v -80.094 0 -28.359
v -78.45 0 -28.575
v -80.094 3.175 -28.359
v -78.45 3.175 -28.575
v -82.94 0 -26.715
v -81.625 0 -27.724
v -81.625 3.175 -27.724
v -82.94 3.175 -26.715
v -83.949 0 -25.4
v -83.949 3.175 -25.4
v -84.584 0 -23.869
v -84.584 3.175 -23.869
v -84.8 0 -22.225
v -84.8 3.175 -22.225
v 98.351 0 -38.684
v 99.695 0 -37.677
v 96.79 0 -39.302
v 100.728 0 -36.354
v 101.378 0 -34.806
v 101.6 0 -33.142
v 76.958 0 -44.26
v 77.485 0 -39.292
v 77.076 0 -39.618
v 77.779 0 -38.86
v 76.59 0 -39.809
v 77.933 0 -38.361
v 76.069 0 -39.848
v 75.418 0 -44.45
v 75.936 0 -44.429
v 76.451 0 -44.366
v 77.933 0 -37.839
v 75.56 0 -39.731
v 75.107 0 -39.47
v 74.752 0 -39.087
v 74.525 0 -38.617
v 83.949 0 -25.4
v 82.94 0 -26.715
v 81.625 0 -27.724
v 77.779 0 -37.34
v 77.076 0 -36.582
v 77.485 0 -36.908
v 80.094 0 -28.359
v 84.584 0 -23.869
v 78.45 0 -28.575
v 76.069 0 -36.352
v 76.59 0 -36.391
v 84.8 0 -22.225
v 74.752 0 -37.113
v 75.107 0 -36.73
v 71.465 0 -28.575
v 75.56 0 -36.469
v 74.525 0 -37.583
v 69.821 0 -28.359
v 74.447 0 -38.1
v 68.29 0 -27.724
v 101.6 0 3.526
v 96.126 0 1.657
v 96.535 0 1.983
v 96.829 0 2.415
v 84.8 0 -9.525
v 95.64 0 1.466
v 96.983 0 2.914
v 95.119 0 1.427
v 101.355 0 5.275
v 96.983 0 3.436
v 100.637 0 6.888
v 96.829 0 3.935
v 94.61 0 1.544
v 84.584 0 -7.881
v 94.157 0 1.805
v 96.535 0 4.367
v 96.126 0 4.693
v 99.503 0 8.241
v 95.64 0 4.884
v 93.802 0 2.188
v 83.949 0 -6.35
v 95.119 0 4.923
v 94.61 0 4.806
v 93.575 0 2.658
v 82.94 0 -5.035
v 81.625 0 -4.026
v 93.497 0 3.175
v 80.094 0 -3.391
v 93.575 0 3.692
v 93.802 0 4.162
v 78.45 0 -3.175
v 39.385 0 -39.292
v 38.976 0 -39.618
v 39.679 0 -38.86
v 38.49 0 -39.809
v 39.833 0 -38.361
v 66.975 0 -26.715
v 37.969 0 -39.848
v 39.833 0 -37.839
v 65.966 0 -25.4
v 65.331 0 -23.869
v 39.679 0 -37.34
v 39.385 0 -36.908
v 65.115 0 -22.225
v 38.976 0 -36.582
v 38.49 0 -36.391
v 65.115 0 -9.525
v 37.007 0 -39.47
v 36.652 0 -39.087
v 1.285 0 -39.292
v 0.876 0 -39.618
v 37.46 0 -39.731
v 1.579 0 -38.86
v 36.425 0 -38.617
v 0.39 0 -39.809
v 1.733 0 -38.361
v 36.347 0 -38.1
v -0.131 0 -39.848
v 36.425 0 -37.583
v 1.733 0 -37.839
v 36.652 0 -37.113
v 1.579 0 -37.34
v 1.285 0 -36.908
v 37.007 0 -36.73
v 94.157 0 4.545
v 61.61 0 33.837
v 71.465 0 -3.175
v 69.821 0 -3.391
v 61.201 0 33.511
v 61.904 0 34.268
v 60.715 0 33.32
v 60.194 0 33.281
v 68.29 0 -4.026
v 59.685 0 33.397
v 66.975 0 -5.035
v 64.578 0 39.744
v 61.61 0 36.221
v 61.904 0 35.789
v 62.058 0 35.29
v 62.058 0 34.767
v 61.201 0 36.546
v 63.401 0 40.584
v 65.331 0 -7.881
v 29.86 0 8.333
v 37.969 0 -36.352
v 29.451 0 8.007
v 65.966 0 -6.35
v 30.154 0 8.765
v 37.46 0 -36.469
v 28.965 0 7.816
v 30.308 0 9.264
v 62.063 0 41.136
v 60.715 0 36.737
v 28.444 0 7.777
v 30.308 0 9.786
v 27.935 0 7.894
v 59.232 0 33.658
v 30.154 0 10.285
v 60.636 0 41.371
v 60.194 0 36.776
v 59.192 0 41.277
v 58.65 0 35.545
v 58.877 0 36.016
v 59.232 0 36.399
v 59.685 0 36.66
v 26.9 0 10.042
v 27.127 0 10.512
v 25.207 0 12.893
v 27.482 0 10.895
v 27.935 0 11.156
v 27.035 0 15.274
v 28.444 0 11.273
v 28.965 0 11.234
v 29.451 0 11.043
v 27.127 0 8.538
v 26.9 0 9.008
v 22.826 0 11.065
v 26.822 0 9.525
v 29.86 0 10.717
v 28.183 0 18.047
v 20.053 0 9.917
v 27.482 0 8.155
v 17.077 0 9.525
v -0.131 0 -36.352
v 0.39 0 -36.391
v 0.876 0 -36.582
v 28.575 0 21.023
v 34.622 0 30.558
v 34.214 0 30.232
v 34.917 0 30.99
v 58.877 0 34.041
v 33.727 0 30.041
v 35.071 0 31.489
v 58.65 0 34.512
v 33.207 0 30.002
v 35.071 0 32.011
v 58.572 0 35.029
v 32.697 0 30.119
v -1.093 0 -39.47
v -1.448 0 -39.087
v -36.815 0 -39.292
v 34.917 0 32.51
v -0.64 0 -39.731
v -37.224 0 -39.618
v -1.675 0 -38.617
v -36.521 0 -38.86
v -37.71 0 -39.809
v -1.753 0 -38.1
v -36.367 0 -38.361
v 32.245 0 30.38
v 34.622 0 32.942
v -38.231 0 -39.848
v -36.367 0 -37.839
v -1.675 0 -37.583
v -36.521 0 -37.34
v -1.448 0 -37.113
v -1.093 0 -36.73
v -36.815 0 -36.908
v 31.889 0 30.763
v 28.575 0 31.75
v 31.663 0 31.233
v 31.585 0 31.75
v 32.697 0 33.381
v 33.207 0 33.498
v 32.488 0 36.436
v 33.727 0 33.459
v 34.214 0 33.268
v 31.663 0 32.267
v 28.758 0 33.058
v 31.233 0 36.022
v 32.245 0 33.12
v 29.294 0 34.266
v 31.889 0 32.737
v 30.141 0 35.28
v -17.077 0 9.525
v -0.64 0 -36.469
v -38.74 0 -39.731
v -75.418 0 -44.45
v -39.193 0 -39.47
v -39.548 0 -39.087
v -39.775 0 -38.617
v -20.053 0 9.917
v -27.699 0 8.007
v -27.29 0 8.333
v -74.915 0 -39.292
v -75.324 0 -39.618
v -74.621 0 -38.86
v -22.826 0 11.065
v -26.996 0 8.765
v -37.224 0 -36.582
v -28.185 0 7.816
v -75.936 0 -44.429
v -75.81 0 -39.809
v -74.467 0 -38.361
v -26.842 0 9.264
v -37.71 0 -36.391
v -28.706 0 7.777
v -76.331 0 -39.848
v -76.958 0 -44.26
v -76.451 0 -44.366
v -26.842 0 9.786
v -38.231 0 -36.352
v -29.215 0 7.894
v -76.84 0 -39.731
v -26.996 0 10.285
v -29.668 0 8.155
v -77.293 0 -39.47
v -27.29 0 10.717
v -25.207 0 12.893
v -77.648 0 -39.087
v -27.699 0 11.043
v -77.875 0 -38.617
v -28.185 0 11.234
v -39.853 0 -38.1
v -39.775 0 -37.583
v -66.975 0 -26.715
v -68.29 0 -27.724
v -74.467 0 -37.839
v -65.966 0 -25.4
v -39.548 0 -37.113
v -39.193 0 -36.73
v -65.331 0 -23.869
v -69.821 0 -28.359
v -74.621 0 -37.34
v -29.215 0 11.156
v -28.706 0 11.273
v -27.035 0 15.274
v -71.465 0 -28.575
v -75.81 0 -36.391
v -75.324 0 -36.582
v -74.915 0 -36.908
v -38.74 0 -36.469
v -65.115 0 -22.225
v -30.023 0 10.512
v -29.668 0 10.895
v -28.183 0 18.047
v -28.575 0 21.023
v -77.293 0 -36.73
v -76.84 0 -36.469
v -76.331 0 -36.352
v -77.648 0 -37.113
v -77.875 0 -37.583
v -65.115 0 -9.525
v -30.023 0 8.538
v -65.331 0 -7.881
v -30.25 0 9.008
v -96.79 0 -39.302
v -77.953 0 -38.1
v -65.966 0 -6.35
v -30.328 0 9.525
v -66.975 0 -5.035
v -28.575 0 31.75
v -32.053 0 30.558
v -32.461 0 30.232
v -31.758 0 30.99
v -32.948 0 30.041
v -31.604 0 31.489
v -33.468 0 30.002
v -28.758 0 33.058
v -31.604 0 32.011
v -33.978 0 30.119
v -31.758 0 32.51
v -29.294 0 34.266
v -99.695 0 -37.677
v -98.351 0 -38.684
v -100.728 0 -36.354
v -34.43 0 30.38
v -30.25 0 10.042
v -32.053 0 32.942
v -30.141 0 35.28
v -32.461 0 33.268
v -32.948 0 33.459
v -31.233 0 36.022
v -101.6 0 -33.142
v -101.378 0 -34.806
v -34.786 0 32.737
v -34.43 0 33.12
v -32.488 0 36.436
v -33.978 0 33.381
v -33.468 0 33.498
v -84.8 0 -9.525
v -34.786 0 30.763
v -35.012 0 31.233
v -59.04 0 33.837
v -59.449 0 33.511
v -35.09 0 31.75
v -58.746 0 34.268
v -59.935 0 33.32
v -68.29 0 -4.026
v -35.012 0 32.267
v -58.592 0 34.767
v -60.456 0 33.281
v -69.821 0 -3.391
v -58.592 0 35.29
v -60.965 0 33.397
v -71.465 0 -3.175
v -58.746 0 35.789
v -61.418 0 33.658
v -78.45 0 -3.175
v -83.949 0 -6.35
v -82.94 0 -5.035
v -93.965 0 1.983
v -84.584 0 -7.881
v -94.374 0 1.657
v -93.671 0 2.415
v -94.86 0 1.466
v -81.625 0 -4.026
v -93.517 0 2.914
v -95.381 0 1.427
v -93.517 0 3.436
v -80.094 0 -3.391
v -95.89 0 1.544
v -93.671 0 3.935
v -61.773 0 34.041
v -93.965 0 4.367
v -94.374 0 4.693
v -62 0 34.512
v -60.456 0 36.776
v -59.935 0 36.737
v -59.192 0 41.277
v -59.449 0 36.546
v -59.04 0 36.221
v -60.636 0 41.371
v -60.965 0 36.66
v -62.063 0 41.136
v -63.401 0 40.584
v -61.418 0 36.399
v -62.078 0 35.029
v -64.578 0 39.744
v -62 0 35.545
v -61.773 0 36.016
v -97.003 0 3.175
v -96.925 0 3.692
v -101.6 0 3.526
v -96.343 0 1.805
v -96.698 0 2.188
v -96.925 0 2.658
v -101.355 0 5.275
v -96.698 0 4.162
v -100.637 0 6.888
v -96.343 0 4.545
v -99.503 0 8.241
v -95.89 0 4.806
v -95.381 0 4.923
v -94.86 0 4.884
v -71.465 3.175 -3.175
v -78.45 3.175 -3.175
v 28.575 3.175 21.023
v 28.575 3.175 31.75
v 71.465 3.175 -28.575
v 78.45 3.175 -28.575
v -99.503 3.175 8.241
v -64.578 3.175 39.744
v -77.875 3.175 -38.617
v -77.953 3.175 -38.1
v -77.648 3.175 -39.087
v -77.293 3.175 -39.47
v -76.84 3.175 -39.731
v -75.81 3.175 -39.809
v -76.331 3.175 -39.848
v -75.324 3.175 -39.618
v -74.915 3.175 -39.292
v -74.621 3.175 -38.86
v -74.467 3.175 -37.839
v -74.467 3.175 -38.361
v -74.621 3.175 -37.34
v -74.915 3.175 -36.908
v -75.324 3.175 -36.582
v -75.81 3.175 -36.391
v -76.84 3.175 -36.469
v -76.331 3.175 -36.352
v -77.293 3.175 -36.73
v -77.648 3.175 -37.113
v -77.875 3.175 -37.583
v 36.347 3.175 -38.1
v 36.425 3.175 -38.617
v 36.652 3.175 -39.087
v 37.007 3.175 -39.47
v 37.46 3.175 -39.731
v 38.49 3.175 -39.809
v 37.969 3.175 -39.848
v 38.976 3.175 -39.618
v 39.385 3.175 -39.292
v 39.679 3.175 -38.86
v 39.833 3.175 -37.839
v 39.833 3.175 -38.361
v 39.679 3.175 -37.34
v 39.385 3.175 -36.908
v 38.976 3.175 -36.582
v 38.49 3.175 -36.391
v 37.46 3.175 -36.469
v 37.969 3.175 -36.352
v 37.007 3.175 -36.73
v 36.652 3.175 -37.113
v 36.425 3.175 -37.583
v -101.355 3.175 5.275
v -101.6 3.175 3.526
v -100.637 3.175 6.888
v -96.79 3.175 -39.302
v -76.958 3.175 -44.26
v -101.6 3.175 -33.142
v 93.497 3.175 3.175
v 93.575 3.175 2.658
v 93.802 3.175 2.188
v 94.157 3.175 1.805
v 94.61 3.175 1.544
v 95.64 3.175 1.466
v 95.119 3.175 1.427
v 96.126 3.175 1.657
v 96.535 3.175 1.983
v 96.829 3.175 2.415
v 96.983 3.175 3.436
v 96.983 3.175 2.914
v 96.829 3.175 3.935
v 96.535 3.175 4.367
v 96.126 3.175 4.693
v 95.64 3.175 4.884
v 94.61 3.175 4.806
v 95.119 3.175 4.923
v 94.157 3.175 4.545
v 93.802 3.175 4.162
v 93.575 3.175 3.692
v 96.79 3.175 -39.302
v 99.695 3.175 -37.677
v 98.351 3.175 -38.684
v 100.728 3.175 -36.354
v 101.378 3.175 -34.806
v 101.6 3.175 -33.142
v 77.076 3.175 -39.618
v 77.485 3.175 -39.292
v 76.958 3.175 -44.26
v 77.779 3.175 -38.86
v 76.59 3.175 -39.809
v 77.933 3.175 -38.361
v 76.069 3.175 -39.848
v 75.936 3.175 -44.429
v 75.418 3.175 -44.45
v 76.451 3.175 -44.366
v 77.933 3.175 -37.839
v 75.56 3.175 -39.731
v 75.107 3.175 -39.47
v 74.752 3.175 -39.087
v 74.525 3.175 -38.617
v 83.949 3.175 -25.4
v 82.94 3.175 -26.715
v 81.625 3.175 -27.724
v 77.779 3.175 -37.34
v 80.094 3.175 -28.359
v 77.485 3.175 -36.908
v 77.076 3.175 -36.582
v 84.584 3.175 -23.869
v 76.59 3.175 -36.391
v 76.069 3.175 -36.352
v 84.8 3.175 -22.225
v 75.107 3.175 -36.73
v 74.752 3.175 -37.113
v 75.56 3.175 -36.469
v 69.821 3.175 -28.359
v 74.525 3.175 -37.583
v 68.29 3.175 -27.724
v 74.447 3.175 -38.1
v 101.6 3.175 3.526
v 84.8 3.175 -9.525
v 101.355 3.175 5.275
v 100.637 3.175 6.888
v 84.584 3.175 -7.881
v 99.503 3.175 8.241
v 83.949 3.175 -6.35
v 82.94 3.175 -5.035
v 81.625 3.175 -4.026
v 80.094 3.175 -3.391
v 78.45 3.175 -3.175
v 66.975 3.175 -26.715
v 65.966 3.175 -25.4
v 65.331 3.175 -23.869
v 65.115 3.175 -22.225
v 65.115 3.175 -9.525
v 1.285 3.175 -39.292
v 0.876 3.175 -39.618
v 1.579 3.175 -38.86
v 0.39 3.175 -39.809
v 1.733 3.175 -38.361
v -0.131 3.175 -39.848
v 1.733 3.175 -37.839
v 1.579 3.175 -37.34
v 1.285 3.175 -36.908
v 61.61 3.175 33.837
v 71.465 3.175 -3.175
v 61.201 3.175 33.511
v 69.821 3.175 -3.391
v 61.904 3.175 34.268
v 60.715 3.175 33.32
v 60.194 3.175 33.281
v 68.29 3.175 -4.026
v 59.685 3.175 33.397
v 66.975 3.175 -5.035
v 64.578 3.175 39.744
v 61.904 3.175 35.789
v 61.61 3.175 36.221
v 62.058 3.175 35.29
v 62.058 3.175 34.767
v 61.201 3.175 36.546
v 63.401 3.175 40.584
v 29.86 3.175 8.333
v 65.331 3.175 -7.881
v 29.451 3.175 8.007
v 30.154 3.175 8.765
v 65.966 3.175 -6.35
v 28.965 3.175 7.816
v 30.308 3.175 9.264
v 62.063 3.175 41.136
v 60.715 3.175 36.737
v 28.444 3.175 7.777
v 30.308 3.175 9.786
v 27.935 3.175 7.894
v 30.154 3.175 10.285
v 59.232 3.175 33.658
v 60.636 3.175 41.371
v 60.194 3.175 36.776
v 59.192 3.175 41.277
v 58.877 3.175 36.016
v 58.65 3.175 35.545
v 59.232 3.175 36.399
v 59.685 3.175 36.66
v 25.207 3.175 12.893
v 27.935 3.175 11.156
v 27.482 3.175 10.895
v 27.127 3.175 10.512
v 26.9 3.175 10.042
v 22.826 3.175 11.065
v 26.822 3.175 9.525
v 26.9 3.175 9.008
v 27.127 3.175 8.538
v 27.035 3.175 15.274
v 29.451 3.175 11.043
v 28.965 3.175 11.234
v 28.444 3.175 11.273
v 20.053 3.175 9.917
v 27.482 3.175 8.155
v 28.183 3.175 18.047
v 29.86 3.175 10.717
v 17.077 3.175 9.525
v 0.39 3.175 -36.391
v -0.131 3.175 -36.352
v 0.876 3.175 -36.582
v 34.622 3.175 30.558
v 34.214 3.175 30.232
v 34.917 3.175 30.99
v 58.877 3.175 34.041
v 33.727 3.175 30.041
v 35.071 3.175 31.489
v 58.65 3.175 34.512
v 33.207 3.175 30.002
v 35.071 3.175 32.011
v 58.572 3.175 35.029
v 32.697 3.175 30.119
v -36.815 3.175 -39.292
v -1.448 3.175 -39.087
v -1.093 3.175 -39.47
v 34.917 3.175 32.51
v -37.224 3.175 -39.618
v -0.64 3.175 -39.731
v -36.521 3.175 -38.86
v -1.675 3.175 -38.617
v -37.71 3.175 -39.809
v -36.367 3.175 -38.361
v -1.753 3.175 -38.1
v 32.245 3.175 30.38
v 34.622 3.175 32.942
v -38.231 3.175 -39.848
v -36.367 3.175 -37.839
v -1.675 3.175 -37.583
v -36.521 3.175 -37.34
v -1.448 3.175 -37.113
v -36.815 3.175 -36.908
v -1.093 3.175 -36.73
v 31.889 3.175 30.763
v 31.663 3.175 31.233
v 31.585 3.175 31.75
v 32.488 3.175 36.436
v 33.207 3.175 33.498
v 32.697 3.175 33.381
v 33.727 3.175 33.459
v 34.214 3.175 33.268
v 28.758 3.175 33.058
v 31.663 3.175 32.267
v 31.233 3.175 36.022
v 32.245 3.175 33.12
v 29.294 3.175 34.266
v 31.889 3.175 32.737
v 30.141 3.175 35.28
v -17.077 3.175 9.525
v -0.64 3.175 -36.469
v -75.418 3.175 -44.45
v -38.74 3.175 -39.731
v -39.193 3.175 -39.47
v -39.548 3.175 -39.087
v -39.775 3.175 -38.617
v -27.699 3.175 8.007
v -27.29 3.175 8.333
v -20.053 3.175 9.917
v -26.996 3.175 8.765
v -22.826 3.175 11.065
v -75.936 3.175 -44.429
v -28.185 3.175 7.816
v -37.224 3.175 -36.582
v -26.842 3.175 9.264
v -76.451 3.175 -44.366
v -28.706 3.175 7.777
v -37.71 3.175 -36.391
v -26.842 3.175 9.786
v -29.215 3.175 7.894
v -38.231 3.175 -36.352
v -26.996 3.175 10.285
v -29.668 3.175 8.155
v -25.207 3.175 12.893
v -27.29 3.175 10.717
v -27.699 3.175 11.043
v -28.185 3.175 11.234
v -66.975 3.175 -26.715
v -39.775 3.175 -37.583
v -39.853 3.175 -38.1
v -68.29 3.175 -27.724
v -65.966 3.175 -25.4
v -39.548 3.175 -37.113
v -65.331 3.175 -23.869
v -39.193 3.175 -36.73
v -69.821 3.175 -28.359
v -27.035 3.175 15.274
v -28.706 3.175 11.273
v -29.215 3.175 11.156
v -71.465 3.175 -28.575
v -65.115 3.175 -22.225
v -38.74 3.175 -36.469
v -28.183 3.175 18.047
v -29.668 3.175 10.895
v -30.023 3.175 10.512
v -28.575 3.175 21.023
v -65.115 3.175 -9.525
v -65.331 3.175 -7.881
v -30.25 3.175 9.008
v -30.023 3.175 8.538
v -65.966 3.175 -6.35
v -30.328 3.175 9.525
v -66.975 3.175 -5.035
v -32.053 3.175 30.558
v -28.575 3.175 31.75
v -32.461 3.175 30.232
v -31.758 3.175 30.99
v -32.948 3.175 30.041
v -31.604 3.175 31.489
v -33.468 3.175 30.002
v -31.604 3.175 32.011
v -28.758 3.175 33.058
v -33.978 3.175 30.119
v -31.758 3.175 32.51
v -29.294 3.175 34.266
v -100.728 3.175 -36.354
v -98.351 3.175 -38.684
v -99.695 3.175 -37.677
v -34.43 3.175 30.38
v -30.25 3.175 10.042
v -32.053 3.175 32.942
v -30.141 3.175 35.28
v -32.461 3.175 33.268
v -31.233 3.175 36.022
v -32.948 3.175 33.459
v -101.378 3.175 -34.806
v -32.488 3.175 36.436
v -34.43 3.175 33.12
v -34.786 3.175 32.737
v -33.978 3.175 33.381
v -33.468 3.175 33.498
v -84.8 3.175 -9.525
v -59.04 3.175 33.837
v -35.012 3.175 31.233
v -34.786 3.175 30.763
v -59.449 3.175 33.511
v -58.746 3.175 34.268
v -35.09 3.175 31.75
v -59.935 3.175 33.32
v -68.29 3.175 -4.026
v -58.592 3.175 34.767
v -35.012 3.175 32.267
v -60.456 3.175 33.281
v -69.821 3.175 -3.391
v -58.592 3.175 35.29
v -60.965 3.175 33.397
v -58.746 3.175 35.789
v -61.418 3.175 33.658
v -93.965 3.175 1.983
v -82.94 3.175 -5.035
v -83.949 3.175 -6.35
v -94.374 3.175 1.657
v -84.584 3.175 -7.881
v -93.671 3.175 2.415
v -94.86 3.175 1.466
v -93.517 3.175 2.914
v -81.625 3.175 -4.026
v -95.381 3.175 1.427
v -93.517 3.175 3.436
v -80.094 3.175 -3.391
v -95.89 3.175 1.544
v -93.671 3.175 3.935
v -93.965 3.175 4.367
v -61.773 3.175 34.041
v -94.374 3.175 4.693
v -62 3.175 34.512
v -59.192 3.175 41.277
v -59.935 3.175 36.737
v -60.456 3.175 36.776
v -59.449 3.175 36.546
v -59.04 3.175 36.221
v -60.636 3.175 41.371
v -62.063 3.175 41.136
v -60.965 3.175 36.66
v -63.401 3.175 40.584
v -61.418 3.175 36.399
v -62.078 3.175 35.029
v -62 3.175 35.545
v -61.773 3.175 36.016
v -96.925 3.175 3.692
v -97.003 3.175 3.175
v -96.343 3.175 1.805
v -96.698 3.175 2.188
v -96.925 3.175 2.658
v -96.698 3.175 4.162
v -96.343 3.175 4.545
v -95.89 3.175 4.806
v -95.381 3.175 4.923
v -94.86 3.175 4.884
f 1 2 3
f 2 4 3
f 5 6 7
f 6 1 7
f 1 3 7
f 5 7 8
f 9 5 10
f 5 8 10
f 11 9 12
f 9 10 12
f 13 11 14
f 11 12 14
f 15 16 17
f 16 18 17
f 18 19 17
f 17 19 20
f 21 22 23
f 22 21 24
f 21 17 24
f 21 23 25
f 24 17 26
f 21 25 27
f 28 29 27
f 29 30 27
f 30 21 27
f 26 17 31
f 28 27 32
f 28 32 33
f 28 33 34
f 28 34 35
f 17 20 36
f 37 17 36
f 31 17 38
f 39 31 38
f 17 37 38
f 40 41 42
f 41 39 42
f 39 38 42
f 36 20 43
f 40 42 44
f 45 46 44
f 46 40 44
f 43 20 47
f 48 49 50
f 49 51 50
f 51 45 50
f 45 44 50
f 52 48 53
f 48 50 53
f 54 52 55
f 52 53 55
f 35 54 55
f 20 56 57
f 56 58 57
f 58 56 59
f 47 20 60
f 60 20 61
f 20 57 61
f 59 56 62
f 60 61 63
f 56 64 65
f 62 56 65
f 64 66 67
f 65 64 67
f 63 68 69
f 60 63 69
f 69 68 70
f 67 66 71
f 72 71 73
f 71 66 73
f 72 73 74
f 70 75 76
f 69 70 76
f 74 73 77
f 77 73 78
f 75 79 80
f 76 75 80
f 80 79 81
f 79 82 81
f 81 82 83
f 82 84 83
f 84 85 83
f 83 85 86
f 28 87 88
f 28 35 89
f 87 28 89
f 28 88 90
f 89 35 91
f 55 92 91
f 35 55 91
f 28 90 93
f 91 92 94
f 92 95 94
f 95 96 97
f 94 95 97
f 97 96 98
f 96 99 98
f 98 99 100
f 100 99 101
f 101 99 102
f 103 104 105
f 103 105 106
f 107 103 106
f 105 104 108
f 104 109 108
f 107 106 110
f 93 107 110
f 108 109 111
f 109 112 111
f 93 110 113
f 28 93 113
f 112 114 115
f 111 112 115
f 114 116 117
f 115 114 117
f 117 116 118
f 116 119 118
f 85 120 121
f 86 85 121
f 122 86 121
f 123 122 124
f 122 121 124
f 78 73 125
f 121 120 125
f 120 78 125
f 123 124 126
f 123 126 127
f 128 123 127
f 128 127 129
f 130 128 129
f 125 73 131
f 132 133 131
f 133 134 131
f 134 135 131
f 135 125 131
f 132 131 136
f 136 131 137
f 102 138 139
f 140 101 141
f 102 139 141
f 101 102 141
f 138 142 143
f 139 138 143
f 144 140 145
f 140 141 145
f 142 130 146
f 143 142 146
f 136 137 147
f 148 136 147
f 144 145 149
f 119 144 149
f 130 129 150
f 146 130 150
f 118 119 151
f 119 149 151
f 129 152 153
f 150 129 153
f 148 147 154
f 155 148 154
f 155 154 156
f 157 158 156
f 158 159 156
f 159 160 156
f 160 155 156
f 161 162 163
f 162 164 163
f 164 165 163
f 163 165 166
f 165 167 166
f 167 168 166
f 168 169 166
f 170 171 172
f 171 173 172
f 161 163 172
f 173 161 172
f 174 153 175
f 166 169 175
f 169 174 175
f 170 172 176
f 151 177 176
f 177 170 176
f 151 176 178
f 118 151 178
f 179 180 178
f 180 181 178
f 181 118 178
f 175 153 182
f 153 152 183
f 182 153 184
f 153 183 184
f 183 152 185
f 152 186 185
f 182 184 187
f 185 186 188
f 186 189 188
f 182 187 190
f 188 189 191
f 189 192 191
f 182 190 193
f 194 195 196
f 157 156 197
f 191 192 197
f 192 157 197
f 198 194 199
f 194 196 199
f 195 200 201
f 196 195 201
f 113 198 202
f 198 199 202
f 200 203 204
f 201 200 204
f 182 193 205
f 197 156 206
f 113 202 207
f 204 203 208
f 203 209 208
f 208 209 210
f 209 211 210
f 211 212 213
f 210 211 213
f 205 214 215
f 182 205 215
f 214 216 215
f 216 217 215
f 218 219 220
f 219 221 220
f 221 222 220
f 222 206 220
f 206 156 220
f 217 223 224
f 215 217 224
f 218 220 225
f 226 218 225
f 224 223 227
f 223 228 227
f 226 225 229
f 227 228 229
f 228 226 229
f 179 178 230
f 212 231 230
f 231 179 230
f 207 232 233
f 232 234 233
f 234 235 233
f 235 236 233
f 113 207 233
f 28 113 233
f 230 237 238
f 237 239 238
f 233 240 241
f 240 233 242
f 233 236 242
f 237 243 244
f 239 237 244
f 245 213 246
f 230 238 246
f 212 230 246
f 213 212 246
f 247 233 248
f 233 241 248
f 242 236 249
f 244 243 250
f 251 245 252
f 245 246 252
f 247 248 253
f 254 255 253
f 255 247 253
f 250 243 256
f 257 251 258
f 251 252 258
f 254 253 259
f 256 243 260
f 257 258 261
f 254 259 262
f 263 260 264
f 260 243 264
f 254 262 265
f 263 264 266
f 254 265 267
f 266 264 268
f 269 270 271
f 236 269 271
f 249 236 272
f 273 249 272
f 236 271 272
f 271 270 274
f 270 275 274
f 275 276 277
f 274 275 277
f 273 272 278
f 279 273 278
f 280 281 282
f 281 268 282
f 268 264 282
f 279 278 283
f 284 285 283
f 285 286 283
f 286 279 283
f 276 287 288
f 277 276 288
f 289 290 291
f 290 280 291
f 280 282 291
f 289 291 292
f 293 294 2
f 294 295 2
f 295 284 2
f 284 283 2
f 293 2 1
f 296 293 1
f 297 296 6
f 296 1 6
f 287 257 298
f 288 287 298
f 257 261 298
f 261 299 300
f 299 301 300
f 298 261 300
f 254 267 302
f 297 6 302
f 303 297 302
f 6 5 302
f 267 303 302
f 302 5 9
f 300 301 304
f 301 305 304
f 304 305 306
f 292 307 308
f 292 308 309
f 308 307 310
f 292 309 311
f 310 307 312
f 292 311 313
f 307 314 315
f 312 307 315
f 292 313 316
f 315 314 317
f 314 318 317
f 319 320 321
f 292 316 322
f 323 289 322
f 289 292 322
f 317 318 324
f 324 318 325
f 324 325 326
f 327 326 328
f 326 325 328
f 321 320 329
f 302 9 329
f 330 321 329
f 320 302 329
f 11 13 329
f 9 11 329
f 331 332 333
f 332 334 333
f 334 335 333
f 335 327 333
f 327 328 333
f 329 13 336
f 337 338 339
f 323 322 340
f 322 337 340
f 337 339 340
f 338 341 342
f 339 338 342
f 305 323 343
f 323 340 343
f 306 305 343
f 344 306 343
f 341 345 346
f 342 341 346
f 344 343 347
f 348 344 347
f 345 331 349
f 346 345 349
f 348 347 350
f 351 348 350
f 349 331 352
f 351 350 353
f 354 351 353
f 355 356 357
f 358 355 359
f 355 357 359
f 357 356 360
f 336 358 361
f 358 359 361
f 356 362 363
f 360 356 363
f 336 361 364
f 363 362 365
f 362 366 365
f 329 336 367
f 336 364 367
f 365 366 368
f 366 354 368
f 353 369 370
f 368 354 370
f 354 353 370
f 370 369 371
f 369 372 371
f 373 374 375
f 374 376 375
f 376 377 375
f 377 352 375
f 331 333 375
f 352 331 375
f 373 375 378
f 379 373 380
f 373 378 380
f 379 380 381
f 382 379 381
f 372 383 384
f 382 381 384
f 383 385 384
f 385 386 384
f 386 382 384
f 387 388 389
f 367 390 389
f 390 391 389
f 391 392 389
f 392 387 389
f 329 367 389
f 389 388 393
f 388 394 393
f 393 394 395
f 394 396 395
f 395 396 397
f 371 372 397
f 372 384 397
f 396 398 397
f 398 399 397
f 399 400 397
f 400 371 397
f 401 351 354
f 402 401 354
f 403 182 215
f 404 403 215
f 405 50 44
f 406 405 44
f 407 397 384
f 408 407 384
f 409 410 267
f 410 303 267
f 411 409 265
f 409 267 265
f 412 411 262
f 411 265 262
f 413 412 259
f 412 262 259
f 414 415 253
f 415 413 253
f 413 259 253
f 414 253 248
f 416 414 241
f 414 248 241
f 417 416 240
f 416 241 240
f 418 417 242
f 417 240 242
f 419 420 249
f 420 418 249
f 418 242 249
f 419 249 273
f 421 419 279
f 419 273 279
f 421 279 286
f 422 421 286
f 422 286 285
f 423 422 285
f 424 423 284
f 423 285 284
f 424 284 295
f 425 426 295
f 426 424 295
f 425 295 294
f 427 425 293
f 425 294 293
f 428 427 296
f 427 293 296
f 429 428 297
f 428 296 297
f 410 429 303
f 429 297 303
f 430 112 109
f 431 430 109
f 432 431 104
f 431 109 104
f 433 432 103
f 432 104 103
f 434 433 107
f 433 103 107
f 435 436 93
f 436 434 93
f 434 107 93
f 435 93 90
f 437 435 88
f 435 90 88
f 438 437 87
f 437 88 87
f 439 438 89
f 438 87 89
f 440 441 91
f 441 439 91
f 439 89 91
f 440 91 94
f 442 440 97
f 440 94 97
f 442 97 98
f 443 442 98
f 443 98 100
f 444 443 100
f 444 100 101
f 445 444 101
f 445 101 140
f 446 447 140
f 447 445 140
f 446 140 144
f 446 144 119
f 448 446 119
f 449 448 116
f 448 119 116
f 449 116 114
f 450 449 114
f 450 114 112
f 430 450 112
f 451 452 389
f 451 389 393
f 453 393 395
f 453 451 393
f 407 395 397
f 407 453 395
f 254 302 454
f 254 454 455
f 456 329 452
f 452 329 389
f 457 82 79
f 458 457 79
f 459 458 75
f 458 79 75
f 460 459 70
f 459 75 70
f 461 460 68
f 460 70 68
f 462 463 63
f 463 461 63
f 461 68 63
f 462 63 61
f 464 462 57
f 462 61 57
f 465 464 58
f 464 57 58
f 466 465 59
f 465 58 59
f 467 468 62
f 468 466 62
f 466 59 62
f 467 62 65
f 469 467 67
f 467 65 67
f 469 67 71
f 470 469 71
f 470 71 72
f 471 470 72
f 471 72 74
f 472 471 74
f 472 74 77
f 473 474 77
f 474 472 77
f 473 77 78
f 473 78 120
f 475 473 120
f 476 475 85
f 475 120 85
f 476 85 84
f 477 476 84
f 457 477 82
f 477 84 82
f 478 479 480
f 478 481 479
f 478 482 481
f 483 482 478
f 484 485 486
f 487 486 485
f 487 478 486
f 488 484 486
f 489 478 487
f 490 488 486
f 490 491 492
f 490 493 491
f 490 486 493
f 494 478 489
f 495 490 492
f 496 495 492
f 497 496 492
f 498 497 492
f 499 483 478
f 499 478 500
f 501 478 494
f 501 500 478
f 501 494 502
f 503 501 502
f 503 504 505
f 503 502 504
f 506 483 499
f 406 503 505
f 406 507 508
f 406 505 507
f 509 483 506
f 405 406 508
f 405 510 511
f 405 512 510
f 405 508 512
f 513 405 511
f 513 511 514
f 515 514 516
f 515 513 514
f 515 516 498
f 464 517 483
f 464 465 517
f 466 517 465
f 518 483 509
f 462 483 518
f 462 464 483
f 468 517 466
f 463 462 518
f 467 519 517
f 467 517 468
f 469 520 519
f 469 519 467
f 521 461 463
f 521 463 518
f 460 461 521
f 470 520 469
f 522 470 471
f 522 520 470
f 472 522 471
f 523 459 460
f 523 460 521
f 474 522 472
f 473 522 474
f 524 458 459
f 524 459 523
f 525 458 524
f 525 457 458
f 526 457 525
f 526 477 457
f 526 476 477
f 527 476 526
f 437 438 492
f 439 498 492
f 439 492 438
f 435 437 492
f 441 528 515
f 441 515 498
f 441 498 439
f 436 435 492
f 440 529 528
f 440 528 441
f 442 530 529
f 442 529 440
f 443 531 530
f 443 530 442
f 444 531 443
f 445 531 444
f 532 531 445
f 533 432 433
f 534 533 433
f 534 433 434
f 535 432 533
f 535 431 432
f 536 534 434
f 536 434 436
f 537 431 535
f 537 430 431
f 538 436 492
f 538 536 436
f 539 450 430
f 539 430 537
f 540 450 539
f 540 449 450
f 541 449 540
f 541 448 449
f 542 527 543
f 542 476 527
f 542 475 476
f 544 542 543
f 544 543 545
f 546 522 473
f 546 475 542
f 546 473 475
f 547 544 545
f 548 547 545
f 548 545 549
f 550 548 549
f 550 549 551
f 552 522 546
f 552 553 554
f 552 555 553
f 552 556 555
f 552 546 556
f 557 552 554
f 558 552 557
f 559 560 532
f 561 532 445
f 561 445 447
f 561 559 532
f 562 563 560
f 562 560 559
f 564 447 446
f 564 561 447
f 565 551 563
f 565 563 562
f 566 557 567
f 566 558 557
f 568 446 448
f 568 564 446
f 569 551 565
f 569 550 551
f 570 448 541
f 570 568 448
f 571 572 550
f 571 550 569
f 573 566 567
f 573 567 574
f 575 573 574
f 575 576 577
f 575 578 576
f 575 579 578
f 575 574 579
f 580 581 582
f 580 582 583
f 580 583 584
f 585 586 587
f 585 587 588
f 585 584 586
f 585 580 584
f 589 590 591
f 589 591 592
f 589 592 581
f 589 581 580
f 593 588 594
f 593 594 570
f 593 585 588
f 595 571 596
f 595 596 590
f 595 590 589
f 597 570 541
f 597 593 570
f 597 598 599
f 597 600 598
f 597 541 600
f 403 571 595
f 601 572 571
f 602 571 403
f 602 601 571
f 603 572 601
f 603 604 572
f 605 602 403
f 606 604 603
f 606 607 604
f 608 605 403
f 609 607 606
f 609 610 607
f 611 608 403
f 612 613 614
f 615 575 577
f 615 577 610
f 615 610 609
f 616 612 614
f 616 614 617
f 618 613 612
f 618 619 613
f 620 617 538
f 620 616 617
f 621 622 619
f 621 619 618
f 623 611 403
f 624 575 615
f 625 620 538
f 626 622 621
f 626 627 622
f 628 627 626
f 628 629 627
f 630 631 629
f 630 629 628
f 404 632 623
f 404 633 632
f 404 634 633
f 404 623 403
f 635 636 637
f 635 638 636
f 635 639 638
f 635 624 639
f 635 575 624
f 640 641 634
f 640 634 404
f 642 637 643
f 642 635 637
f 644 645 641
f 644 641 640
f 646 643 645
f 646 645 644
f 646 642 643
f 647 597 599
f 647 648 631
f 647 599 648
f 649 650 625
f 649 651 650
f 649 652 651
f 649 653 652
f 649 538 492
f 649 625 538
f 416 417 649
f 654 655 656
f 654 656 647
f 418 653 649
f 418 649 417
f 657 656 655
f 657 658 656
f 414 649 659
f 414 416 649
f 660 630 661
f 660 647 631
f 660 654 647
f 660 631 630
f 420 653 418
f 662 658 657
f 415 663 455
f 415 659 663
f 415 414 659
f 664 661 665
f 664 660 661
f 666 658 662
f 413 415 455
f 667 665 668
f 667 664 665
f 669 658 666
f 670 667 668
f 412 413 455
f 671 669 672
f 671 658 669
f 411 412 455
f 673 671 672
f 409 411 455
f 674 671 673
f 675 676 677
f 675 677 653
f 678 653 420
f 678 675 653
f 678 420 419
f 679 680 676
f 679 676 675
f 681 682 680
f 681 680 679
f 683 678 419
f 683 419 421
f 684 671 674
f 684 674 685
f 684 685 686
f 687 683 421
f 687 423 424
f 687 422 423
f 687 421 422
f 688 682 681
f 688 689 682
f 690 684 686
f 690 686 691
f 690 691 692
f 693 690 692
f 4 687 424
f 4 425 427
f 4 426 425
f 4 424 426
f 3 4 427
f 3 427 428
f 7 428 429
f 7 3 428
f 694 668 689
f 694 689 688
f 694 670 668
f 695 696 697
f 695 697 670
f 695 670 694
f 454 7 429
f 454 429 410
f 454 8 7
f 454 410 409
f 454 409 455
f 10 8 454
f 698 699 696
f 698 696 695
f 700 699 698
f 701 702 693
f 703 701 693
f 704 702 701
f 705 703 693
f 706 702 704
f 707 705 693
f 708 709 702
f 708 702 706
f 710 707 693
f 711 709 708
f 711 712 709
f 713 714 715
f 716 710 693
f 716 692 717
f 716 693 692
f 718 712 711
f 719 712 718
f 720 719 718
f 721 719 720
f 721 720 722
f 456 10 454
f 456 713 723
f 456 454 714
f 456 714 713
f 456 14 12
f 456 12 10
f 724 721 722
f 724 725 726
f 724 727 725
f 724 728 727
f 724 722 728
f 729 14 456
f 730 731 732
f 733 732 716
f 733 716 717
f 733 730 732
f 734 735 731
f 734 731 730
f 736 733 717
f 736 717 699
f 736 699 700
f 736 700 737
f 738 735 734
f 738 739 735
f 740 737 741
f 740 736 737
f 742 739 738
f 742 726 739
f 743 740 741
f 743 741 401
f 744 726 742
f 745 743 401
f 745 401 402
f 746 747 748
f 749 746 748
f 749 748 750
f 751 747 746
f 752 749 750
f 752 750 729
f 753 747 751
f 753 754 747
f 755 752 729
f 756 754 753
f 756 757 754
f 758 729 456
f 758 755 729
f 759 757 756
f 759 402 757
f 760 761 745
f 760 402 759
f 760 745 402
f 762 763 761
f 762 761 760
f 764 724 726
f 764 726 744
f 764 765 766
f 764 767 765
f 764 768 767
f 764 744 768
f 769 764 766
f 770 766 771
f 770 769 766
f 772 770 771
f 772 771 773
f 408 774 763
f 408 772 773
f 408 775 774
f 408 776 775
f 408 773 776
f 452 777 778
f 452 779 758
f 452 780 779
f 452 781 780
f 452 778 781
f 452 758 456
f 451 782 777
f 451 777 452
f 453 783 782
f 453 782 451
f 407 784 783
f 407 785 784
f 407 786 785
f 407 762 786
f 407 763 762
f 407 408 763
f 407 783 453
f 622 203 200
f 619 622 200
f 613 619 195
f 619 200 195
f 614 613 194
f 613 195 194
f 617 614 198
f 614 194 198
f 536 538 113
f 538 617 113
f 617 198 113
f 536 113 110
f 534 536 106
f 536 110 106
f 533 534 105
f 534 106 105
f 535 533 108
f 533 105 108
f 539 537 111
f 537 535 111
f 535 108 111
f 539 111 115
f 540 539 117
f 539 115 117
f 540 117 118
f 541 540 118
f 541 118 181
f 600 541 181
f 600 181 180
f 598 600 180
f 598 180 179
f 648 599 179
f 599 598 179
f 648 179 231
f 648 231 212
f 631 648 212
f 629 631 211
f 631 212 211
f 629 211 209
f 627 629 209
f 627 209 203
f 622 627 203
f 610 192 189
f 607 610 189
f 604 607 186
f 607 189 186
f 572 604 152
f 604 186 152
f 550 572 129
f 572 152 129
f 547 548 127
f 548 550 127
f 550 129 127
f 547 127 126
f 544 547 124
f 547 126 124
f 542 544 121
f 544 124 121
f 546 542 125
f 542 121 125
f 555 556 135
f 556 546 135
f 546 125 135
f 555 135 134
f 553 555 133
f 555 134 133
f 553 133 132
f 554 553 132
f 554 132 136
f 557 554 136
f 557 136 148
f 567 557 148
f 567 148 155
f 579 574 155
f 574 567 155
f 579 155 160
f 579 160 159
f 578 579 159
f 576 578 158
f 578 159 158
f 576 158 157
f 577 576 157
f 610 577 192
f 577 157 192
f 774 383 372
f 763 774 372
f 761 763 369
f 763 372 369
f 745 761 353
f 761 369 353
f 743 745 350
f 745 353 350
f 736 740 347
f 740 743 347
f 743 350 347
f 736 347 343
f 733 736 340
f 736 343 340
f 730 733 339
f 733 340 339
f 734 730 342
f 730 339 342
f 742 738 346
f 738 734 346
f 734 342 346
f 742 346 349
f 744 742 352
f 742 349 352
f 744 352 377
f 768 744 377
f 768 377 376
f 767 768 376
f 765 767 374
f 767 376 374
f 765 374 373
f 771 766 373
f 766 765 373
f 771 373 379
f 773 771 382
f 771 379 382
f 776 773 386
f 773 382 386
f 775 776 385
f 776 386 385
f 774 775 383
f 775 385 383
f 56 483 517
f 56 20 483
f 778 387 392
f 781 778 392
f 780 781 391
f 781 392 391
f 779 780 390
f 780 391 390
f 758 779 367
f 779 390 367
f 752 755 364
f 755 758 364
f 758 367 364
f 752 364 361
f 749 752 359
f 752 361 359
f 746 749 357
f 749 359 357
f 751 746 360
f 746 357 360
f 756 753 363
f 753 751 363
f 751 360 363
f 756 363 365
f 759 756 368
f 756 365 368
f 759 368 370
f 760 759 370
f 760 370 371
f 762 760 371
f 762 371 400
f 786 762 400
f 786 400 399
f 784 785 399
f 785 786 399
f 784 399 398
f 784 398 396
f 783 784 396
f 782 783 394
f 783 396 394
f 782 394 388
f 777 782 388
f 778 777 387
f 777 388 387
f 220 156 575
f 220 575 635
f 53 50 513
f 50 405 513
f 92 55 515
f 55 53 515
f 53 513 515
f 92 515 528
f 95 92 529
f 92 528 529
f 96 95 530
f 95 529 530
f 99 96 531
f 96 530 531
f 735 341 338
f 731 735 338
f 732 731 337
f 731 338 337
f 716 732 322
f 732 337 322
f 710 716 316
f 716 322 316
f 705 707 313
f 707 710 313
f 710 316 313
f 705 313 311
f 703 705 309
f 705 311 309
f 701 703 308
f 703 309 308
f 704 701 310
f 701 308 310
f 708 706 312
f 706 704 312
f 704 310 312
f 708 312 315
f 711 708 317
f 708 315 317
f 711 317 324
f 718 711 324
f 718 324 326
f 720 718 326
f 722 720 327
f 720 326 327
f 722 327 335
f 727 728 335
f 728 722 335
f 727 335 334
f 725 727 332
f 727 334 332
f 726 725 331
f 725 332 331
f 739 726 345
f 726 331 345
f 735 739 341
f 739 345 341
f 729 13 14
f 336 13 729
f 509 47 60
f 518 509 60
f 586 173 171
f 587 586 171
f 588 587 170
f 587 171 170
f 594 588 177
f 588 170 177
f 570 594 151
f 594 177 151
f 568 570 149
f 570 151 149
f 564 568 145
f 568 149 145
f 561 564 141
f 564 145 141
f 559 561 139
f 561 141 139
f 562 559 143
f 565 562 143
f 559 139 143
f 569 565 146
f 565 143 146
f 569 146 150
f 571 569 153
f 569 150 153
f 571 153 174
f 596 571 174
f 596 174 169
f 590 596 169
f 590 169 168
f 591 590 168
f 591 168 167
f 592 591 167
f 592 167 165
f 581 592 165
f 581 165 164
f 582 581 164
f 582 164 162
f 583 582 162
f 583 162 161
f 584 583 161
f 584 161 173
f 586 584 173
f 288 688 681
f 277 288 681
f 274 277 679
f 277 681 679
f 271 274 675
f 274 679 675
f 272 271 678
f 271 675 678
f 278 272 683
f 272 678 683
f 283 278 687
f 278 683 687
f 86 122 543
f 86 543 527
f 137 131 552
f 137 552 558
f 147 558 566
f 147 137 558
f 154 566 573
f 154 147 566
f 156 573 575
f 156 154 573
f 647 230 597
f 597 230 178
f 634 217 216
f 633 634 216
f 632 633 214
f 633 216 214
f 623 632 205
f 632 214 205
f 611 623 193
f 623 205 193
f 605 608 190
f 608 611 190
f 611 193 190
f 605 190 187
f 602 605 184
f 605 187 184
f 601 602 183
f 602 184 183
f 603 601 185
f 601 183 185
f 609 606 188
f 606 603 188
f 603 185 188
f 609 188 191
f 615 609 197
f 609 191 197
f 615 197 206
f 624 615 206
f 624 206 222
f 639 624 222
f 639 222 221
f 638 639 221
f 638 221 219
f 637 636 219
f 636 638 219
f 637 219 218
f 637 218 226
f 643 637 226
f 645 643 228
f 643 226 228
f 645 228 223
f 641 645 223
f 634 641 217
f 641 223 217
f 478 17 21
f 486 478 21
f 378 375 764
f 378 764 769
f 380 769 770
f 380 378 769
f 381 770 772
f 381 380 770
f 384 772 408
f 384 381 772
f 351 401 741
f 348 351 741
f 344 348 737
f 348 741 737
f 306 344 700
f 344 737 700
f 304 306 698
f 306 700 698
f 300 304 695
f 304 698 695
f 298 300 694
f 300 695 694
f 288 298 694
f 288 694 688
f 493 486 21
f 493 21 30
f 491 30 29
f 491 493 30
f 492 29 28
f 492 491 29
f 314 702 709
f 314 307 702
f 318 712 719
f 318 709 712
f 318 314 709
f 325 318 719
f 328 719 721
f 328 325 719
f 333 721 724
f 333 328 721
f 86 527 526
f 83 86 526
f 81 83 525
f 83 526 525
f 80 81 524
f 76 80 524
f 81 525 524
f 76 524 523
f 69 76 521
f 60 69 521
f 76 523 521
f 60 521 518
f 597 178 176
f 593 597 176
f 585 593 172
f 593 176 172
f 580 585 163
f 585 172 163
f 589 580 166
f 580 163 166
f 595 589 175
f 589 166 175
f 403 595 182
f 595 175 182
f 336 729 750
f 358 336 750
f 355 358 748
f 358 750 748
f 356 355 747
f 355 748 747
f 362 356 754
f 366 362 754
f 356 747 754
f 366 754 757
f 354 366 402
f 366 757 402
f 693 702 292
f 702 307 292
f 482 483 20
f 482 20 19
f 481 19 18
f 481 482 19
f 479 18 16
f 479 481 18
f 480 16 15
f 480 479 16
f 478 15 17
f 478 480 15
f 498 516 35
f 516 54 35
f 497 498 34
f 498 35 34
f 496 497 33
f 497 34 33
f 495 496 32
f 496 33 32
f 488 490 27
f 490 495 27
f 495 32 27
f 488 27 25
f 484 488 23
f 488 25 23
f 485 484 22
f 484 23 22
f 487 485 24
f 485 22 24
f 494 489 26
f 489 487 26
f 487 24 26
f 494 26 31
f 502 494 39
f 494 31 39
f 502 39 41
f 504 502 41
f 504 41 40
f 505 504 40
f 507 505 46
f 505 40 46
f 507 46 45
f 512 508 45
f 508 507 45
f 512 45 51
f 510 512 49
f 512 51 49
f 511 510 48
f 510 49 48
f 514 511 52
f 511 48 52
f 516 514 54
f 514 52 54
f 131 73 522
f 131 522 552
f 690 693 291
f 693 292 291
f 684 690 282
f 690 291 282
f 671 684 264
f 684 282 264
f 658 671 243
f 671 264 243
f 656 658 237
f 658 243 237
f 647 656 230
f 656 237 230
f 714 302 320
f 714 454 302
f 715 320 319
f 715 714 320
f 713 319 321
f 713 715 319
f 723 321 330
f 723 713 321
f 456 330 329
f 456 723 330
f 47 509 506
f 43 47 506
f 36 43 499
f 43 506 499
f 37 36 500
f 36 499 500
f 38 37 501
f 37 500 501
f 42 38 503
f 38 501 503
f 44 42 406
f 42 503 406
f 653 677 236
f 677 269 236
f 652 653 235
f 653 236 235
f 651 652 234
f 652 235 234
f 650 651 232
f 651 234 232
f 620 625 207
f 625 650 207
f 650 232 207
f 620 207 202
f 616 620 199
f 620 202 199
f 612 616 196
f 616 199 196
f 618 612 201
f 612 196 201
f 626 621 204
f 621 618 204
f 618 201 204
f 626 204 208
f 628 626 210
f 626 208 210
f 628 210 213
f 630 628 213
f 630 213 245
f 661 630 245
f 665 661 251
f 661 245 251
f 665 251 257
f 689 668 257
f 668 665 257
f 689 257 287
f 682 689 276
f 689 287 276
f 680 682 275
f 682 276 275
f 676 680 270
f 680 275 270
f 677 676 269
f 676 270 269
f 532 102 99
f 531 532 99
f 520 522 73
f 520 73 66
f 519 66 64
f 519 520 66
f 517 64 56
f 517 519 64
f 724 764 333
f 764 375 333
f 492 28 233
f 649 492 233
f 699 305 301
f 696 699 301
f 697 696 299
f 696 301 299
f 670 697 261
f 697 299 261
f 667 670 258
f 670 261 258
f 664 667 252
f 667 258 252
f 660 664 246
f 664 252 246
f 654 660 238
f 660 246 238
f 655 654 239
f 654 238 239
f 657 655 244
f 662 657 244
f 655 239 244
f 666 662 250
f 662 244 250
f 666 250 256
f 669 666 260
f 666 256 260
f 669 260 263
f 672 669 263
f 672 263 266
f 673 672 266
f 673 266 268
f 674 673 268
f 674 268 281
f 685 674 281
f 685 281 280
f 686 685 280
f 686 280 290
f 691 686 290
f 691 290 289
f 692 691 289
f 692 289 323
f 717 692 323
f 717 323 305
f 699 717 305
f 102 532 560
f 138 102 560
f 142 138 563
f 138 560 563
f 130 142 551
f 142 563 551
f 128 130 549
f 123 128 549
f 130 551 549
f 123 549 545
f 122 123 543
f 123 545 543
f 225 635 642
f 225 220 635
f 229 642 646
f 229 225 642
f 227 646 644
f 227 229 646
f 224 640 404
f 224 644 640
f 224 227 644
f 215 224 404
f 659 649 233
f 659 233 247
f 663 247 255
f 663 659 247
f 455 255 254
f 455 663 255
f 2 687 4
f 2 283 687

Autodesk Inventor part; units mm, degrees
ref_plane "YZ Plane" through (0, 0, 0) normal (1, 0, 0) x (0, 1, 0)
ref_plane "XZ Plane" through (0, 0, 0) normal (0, 1, 0) x (-1, 0, 0)
ref_plane "XY Plane" through (0, 0, 0) normal (0, 0, 1) x (1, 0, 0)
sketch "Sketch1" plane through (0, 0, 0) normal (0, 1, 0) x (-1, 0, 0)
  line L0 (101.6, 38.1) -> (-101.6, 38.1) construction
  line L1 (-101.6, 38.1) -> (-101.6, -38.1) construction
  line L2 (-101.6, -38.1) -> (101.6, -38.1) construction
  line L3 (101.6, -38.1) -> (101.6, 38.1) construction
  line L4 (101.6, 38.1) -> (-101.6, -38.1) construction
  line L5 (-101.6, 38.1) -> (101.6, -38.1) construction
  line L6 (-28.575, 66.675) -> (28.575, 66.675) construction
  line L7 (28.575, 66.675) -> (28.575, 9.525)
  line L8 (28.575, 9.525) -> (-28.575, 9.525)
  line L9 (-28.575, 9.525) -> (-28.575, 66.675)
  line L10 (-28.575, 66.675) -> (28.575, 9.525) construction
  line L11 (28.575, 66.675) -> (-28.575, 9.525) construction
  circle A0 centre (-38.1, 50.8) radius 3.175
  line L12 (0, 38.1) -> (0, -38.1) construction
  circle A1 centre (-38.1, 50.8) radius 9.525
  line L13 (-38.1, 60.325) -> (-28.575, 60.325)
  circle A2 centre (38.1, 50.8) radius 3.175
  circle A3 centre (38.1, 50.8) radius 9.525
  line L14 (38.1, 60.325) -> (28.575, 60.325)
  circle A4 centre (-76.2, -38.1) radius 1.7526
  circle A5 centre (-95.25, 3.175) radius 1.7526
  circle A6 centre (76.2, -38.1) radius 1.7526
  circle A7 centre (95.25, 3.175) radius 1.7526
  line L15 (-101.6, -38.1) -> (-101.6, 6.35)
  line L16 (-101.6, 6.35) -> (-44.4797, 57.8728)
  line L17 (101.6, -38.1) -> (101.6, 6.35)
  line L18 (101.6, 6.35) -> (44.4797, 57.8728)
  line L19 (-42.6417, 42.4275) -> (-87.975, 1.5367)
  line L20 (-87.975, 1.5367) -> (-87.975, -38.1)
  line L21 (87.975, -38.1) -> (87.975, 1.5367)
  line L22 (87.975, 1.5367) -> (42.6417, 42.4275)
  line L23 (0, -38.1) -> (-95.25, -38.1) construction
  line L24 (0, -38.1) -> (95.25, -38.1) construction
  circle A8 centre (-60.325, 35.0287) radius 1.7526
  circle A9 centre (-33.3375, 31.75) radius 1.7526
  line L25 (-38.1, 0) -> (-38.1, 41.275)
  line L26 (-38.1, 0) -> (0, 0) construction
  circle A10 centre (60.325, 35.0287) radius 1.7526
  circle A11 centre (33.3375, 31.75) radius 1.7526
  line L27 (38.1, 0) -> (38.1, 41.275)
  line L28 (38.1, 0) -> (0, 0) construction
  line L29 (-87.975, 0) -> (-65.115, 0)
  line L30 (-65.115, 0) -> (-65.115, -31.75)
  line L31 (-65.115, -31.75) -> (-87.975, -31.75)
  line L32 (-101.6, -38.1) -> (101.6, -38.1) construction
  line L33 (101.6, -38.1) -> (101.6, 19.05)
  line L34 (101.6, 19.05) -> (-101.6, 19.05) construction
  line L35 (-101.6, 19.05) -> (-101.6, -38.1)
  line L36 (-101.6, 19.05) -> (-87.5203, 19.05) construction
  line L37 (87.5203, 19.05) -> (101.6, 19.05) construction
  circle A12 centre (-38.1, 0) radius 3.175 construction
  circle A13 centre (-38.1, 0) radius 6.35 construction
  circle A14 centre (38.1, 0) radius 3.175 construction
  circle A15 centre (38.1, 0) radius 6.35 construction
  circle A16 centre (28.575, 9.525) radius 1.7526
  circle A17 centre (28.575, 9.525) radius 4.7625
  arc A18 (17.0773, 9.525) -> (28.575, 21.0227) centre (17.0773, 21.0227) ccw
  circle A19 centre (-28.575, 9.525) radius 1.7526
  circle A20 centre (-28.575, 9.525) radius 4.7625
  arc A21 (-28.575, 21.0227) -> (-17.0773, 9.525) centre (-17.0773, 21.0227) ccw
  arc A22 (31.4325, 5.715) -> (38.1, 19.05) centre (21.4312, 19.05) ccw
  arc A23 (-38.1, 19.05) -> (-31.4325, 5.715) centre (-21.4312, 19.05) ccw
  line L38 (-61.94, -38.1) -> (-61.94, 25.0204)
  line L39 (87.975, 0) -> (65.115, 0)
  line L40 (65.115, 0) -> (65.115, -31.75)
  line L41 (65.115, -31.75) -> (87.975, -31.75)
  line L42 (61.94, -38.1) -> (61.94, 25.0204)
  line L43 (-28.575, 4.7625) -> (28.575, 4.7625)
  line L44 (101.6, -31.75) -> (-101.6, -31.75)
  line L45 (-101.6, -31.75) -> (-101.6, -44.45) construction
  line L46 (-101.6, -44.45) -> (101.6, -44.45)
  line L47 (101.6, -44.45) -> (101.6, -31.75) construction
  circle A24 centre (0, -38.1) radius 1.7526
  circle A25 centre (38.1, -38.1) radius 1.7526
  circle A26 centre (-38.1, -38.1) radius 1.7526
  line L48 (101.6, -38.1) -> (76.2, -44.45)
  line L49 (-101.6, -38.1) -> (-76.2, -44.45)
  line L50 (76.2, -38.1) -> (76.2, -44.45) construction
  line L51 (-76.2, -38.1) -> (-76.2, -44.45) construction
  line L52 (59.1924, 41.2769) -> (32.488, 36.4361)
  circle A27 centre (60.325, 35.0287) radius 6.35
  circle A28 centre (33.3375, 31.75) radius 4.7625
  line L53 (-59.1924, 41.2769) -> (-32.488, 36.4361)
  circle A29 centre (-60.325, 35.0287) radius 6.35
  circle A30 centre (-33.3375, 31.75) radius 4.7625
  line L54 (-87.975, 0) -> (-65.115, 0)
  line L55 (-65.115, 0) -> (-65.115, -3.175)
  line L56 (-65.115, -3.175) -> (-87.975, -3.175)
  line L57 (-87.975, -3.175) -> (-87.975, 0)
  line L58 (-65.115, -15.875) -> (-87.975, -15.875) construction
  line L59 (-65.115, -28.575) -> (-87.975, -28.575)
  line L60 (-84.8, -38.1) -> (-84.8, 0.1248)
  line L61 (65.115, -3.175) -> (87.975, -3.175)
  line L62 (65.115, -15.875) -> (87.975, -15.875) construction
  line L63 (65.115, -28.575) -> (87.975, -28.575)
  line L64 (84.8, -38.1) -> (84.8, 0.1248)
  point P0 (28.575, 38.1)
  point P1 (-28.575, 38.1)
  point P2 (28.575, 60.325)
  point P3 (44.4797, 57.8728)
  point P4 (101.6, -15.875)
  point P5 (38.1, 41.275)
  point P6 (-87.975, -31.75)
  point P7 (-101.6, 6.35)
  point P8 (101.6, 6.35)
  point P9 (31.75, 0)
  point P10 (38.1, 6.35)
  point P11 (-38.1, 6.35)
  point P12 (-31.75, 0)
  point P13 (87.975, 0)
  point P14 (61.94, 25.0204)
  point P15 (-17.0773, 9.525)
  point P16 (-28.575, 21.0227)
  point P17 (-38.1, 19.05)
  point P18 (-31.4325, 5.715)
  point P19 (-21.8502, 0)
  point P20 (21.8502, 0)
  point P21 (-25.2074, 12.8926)
  point P22 (-28.575, 14.2875)
  point P23 (-23.8125, 9.525)
  point P24 (-28.575, 50.8)
  point P25 (25.2074, 12.8926)
  point P26 (28.575, 14.2875)
  point P27 (23.8125, 9.525)
  point P28 (28.575, 50.8)
  point P29 (26.8224, 9.525)
  point P30 (28.575, 11.2776)
  point P31 (61.94, -31.75)
  point P32 (-61.94, -31.75)
  point P33 (-28.575, 31.75)
  point P34 (-64.5781, 39.7439)
  point P35 (64.5781, 39.7439)
  point P36 (28.575, 31.75)
  point P37 (-84.8, -3.175)
  point P38 (-84.8, -28.575)
  point P39 (84.8, -3.175)
  point P40 (84.8, -28.575)
  point P41 (-101.6, -31.75)
  point P42 (-56.0719, 30.3135)
  point P43 (56.0719, 30.3135)
  point P44 (46.4735, 38.9713)
  point P45 (-46.4735, 38.9713)
  point P46 (-28.575, 11.2776)
  point P47 (-26.8224, 9.525)
  dimension "d0" = 203.2
  dimension "d1" = 76.2
  dimension "d4" = 57.15
  dimension "d6" = 6.35
  dimension "d7" = 38.1
  dimension "d8" = 19.05
  dimension "d10" = 3.5052
  dimension "d11" = 3.5052
  dimension "d12" = 0
  dimension "d14" = 25.4
  dimension "d15" = 6.35
  dimension "d20" = 50.8
  dimension "d21" = 41.275
  dimension "d22" = 44.45
  dimension "d24" = 12.7
  dimension "d25" = 13.625
  dimension "d26" = 12.7
  dimension "d27" = 13.625
  dimension "d31" = 3.5052
  dimension "d32" = 3.5052
  dimension "d33" = 6.35
  dimension "d34" = 31.75
  dimension "d35" = 4.7625
  dimension "d36" = 22.225
  dimension "d37" = 9.525
  dimension "d39" = 31.75
  dimension "d40" = 6.35
  dimension "d42" = 57.15
  dimension "d43" = 6.35
  dimension "d44" = 9.525
  dimension "d45" = 9.525
  dimension "d46" = 12.7
  dimension "d104" = 3.5052
  dimension "d105" = 9.525
  dimension "d106" = 3.175
  dimension "d107" = 22.86
  dimension "d123" = 88.9
  dimension "d124" = 12.7
  dimension "d125" = 3.5052
  dimension "d126" = 3.5052
  dimension "d127" = 38.1
  dimension "d128" = 28.575
  dimension "d129" = 3.175
  dimension "d130" = 3.175
extrude "Extrusion1" add sketch "Sketch1" along normal blind 3.175 contours A28 L27 A22 A17 L7 | A28 | L7 A17 A18 | L52 L27 A28 | L27 L52 L22 L42 L44 L38 L19 L53 L25 A23 A20 L43 A17 A22 | L18 L17 L44 L21 L22 A27 | A27 | A17 L8 A16 L7 | L7 A16 L8 A17 | A17 L8 A18 | L52 A27 L22 | A17 L43 A20 L8 | L17 L48 L46 L49 L15 L44 L31 L41 | L8 A20 A21 | L22 L21 L39 L40 L44 L42 | L41 L64 L63 L21 | A20 L9 A19 L8 | L8 A19 L9 A20 | A20 L9 A21 | L63 L64 L61 L21 | L41 L40 L63 L64 | A23 L25 A30 L9 A20 | L21 L61 L64 L39 | L44 L30 L29 L20 L19 L38 | A30 | L64 L61 L40 L39 | L19 L20 L44 L15 L16 A29 | L31 L60 L59 L30 | L25 L53 A30 | A29 L53 L19 | A29 | L31 L20 L59 L60 | L29 L60 L56 L20 | L56 L60 L29 L30 | L59 L20 L56 L60
fillet "Fillet1" radius 6.35 14 edges at (101.6, 1.5875, -38.1) (101.6, 1.5875, 6.35) (-101.6, 1.5875, 6.35) (76.2, 1.5875, -44.45) (-76.2, 1.5875, -44.45) (-101.6, 1.5875, -38.1) (-65.115, 1.5875, -3.175) (-65.115, 1.5875, -28.575) (-84.8, 1.5875, -3.175) (-84.8, 1.5875, -28.575) (84.8, 1.5875, -3.175) (65.115, 1.5875, -3.175) (84.8, 1.5875, -28.575) (65.115, 1.5875, -28.575)
equation "\"d35\" = 0.5 * d37"
properties part number "Chassis" material "UHMW, Black"
